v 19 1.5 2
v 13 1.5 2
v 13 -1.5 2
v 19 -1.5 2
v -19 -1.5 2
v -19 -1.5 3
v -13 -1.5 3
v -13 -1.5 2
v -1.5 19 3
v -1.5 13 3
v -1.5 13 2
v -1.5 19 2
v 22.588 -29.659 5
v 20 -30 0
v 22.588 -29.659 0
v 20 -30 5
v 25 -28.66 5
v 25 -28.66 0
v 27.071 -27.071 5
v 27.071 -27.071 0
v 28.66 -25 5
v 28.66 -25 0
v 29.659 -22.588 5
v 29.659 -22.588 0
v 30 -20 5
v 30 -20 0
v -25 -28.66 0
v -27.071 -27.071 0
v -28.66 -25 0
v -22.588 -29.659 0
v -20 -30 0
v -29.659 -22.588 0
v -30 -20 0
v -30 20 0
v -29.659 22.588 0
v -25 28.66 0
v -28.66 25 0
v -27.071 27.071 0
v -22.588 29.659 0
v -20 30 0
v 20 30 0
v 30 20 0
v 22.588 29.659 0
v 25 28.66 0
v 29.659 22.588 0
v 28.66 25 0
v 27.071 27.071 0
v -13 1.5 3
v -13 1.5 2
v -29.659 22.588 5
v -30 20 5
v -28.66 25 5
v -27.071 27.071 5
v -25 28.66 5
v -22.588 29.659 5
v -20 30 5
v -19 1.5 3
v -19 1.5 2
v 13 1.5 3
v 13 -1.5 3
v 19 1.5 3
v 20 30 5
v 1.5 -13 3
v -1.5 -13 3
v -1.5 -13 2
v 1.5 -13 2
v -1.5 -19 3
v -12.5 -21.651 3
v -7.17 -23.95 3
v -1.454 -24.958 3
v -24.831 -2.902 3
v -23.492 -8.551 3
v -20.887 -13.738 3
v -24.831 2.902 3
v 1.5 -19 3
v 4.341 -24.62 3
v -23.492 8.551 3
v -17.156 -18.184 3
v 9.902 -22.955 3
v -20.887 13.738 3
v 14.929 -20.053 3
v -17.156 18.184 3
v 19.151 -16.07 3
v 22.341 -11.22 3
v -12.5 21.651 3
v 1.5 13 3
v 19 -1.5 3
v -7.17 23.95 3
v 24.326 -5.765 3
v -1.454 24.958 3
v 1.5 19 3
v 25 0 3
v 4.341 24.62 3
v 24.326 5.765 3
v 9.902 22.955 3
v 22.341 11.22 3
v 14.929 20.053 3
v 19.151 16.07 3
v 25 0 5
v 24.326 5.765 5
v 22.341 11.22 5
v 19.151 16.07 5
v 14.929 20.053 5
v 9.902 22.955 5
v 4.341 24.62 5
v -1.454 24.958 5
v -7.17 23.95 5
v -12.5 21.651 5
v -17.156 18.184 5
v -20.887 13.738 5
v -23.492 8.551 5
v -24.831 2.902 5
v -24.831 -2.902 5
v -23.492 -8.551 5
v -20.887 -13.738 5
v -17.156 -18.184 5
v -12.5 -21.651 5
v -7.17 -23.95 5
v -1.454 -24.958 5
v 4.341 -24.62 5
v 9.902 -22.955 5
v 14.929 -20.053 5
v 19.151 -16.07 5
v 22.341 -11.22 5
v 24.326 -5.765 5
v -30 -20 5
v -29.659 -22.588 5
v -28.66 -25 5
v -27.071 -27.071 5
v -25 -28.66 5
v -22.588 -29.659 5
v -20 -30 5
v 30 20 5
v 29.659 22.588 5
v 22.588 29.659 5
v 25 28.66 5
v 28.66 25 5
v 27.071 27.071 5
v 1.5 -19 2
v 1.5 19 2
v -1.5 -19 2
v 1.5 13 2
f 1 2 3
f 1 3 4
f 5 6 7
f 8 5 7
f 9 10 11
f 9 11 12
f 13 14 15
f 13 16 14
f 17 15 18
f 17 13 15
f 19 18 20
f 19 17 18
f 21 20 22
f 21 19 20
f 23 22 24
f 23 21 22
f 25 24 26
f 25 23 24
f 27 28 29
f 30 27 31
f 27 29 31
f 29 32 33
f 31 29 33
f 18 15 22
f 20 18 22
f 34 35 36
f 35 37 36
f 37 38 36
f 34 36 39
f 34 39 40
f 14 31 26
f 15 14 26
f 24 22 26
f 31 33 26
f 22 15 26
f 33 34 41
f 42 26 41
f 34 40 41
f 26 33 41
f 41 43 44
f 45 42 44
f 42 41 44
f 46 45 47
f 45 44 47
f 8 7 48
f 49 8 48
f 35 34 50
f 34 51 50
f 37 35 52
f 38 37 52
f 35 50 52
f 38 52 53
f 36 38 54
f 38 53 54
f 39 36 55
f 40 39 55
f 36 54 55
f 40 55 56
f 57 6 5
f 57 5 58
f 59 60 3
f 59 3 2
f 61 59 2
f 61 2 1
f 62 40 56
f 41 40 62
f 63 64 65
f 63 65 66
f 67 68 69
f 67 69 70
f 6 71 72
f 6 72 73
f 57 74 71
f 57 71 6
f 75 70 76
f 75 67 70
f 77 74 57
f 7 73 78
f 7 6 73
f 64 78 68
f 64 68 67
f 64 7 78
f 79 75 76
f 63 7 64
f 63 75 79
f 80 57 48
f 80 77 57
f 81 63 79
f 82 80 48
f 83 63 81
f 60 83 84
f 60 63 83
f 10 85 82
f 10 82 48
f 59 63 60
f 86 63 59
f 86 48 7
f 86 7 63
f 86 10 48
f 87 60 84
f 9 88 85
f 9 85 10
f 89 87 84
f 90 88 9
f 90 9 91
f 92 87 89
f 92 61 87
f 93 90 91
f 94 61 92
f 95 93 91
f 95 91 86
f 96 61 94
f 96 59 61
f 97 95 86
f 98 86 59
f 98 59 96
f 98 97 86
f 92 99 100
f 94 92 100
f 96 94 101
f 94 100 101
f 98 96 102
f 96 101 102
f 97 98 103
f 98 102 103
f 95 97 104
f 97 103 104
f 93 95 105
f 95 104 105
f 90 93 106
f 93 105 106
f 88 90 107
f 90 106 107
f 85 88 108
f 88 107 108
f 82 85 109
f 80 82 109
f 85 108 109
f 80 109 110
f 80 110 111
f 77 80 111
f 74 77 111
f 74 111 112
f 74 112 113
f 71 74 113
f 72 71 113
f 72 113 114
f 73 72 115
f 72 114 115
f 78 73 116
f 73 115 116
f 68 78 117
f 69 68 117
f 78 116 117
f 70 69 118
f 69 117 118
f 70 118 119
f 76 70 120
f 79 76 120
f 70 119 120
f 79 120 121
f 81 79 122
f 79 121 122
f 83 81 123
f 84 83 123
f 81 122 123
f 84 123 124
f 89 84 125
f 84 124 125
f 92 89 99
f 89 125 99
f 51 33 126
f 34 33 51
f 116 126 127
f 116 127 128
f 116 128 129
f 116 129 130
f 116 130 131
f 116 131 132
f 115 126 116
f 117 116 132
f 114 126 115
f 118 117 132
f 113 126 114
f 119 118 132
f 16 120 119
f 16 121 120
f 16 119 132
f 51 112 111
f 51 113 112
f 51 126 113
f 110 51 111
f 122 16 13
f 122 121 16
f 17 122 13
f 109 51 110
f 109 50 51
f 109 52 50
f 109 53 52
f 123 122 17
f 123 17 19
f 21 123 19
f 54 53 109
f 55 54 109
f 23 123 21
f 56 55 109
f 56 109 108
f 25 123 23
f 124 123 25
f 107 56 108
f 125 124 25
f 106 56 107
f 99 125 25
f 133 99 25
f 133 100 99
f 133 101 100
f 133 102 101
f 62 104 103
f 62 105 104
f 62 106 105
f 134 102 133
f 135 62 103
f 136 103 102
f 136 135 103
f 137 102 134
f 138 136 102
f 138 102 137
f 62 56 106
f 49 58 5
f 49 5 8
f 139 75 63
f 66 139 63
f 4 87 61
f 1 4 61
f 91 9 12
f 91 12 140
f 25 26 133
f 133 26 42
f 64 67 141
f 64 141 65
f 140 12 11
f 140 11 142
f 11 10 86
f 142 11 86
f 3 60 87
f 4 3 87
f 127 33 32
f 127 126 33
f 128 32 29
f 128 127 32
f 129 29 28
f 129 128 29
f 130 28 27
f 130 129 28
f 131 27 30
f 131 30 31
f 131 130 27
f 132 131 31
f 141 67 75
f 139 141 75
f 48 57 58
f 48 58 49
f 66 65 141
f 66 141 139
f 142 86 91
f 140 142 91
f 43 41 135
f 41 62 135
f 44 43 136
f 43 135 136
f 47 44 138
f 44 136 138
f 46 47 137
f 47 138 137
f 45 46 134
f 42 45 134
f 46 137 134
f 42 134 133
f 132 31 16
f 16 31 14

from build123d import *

# Parameters (mm, degrees)
F0_W     = 60
F0_H     = 60
F1_DEPTH = 5
F2_R     = 25
F3_DEPTH = 2
F4_R     = 10
F5_W     = 3
F5_H     = 6
F5_W_2   = 6
F5_H_2   = 3
F6_DEPTH = 1


with BuildPart() as f1:
    # F0 (on Top) → F1 (new body)
    with BuildSketch(Plane.XY):
        Rectangle(F0_W, F0_H)
    extrude(amount=F1_DEPTH)

    # F2 (on face) → F3 (cut)
    with BuildSketch(Plane.XY.offset(5)):
        Circle(F2_R)
    extrude(amount=-F3_DEPTH, mode=Mode.SUBTRACT)

    # F4
    f4_edges = [f1.edges().sort_by_distance(p)[0] for p in [
        (-30, -30, 2.5),
        (30, -30, 2.5),
        (30, 30, 2.5),
        (-30, 30, 2.5),
    ]]
    fillet(f4_edges, radius=F4_R)

    # F5 (on face) → F6 (cut)
    with BuildSketch(Plane.XY.offset(3)):
        with Locations((0, 16)):
            Rectangle(F5_W, F5_H)
        with Locations((-16, 0)):
            Rectangle(F5_W_2, F5_H_2)
        with Locations((0, -16)):
            Rectangle(F5_W, F5_H)
        with Locations((16, 0)):
            Rectangle(F5_W_2, F5_H_2)
    extrude(amount=-F6_DEPTH, mode=Mode.SUBTRACT)


solid = f1.part
